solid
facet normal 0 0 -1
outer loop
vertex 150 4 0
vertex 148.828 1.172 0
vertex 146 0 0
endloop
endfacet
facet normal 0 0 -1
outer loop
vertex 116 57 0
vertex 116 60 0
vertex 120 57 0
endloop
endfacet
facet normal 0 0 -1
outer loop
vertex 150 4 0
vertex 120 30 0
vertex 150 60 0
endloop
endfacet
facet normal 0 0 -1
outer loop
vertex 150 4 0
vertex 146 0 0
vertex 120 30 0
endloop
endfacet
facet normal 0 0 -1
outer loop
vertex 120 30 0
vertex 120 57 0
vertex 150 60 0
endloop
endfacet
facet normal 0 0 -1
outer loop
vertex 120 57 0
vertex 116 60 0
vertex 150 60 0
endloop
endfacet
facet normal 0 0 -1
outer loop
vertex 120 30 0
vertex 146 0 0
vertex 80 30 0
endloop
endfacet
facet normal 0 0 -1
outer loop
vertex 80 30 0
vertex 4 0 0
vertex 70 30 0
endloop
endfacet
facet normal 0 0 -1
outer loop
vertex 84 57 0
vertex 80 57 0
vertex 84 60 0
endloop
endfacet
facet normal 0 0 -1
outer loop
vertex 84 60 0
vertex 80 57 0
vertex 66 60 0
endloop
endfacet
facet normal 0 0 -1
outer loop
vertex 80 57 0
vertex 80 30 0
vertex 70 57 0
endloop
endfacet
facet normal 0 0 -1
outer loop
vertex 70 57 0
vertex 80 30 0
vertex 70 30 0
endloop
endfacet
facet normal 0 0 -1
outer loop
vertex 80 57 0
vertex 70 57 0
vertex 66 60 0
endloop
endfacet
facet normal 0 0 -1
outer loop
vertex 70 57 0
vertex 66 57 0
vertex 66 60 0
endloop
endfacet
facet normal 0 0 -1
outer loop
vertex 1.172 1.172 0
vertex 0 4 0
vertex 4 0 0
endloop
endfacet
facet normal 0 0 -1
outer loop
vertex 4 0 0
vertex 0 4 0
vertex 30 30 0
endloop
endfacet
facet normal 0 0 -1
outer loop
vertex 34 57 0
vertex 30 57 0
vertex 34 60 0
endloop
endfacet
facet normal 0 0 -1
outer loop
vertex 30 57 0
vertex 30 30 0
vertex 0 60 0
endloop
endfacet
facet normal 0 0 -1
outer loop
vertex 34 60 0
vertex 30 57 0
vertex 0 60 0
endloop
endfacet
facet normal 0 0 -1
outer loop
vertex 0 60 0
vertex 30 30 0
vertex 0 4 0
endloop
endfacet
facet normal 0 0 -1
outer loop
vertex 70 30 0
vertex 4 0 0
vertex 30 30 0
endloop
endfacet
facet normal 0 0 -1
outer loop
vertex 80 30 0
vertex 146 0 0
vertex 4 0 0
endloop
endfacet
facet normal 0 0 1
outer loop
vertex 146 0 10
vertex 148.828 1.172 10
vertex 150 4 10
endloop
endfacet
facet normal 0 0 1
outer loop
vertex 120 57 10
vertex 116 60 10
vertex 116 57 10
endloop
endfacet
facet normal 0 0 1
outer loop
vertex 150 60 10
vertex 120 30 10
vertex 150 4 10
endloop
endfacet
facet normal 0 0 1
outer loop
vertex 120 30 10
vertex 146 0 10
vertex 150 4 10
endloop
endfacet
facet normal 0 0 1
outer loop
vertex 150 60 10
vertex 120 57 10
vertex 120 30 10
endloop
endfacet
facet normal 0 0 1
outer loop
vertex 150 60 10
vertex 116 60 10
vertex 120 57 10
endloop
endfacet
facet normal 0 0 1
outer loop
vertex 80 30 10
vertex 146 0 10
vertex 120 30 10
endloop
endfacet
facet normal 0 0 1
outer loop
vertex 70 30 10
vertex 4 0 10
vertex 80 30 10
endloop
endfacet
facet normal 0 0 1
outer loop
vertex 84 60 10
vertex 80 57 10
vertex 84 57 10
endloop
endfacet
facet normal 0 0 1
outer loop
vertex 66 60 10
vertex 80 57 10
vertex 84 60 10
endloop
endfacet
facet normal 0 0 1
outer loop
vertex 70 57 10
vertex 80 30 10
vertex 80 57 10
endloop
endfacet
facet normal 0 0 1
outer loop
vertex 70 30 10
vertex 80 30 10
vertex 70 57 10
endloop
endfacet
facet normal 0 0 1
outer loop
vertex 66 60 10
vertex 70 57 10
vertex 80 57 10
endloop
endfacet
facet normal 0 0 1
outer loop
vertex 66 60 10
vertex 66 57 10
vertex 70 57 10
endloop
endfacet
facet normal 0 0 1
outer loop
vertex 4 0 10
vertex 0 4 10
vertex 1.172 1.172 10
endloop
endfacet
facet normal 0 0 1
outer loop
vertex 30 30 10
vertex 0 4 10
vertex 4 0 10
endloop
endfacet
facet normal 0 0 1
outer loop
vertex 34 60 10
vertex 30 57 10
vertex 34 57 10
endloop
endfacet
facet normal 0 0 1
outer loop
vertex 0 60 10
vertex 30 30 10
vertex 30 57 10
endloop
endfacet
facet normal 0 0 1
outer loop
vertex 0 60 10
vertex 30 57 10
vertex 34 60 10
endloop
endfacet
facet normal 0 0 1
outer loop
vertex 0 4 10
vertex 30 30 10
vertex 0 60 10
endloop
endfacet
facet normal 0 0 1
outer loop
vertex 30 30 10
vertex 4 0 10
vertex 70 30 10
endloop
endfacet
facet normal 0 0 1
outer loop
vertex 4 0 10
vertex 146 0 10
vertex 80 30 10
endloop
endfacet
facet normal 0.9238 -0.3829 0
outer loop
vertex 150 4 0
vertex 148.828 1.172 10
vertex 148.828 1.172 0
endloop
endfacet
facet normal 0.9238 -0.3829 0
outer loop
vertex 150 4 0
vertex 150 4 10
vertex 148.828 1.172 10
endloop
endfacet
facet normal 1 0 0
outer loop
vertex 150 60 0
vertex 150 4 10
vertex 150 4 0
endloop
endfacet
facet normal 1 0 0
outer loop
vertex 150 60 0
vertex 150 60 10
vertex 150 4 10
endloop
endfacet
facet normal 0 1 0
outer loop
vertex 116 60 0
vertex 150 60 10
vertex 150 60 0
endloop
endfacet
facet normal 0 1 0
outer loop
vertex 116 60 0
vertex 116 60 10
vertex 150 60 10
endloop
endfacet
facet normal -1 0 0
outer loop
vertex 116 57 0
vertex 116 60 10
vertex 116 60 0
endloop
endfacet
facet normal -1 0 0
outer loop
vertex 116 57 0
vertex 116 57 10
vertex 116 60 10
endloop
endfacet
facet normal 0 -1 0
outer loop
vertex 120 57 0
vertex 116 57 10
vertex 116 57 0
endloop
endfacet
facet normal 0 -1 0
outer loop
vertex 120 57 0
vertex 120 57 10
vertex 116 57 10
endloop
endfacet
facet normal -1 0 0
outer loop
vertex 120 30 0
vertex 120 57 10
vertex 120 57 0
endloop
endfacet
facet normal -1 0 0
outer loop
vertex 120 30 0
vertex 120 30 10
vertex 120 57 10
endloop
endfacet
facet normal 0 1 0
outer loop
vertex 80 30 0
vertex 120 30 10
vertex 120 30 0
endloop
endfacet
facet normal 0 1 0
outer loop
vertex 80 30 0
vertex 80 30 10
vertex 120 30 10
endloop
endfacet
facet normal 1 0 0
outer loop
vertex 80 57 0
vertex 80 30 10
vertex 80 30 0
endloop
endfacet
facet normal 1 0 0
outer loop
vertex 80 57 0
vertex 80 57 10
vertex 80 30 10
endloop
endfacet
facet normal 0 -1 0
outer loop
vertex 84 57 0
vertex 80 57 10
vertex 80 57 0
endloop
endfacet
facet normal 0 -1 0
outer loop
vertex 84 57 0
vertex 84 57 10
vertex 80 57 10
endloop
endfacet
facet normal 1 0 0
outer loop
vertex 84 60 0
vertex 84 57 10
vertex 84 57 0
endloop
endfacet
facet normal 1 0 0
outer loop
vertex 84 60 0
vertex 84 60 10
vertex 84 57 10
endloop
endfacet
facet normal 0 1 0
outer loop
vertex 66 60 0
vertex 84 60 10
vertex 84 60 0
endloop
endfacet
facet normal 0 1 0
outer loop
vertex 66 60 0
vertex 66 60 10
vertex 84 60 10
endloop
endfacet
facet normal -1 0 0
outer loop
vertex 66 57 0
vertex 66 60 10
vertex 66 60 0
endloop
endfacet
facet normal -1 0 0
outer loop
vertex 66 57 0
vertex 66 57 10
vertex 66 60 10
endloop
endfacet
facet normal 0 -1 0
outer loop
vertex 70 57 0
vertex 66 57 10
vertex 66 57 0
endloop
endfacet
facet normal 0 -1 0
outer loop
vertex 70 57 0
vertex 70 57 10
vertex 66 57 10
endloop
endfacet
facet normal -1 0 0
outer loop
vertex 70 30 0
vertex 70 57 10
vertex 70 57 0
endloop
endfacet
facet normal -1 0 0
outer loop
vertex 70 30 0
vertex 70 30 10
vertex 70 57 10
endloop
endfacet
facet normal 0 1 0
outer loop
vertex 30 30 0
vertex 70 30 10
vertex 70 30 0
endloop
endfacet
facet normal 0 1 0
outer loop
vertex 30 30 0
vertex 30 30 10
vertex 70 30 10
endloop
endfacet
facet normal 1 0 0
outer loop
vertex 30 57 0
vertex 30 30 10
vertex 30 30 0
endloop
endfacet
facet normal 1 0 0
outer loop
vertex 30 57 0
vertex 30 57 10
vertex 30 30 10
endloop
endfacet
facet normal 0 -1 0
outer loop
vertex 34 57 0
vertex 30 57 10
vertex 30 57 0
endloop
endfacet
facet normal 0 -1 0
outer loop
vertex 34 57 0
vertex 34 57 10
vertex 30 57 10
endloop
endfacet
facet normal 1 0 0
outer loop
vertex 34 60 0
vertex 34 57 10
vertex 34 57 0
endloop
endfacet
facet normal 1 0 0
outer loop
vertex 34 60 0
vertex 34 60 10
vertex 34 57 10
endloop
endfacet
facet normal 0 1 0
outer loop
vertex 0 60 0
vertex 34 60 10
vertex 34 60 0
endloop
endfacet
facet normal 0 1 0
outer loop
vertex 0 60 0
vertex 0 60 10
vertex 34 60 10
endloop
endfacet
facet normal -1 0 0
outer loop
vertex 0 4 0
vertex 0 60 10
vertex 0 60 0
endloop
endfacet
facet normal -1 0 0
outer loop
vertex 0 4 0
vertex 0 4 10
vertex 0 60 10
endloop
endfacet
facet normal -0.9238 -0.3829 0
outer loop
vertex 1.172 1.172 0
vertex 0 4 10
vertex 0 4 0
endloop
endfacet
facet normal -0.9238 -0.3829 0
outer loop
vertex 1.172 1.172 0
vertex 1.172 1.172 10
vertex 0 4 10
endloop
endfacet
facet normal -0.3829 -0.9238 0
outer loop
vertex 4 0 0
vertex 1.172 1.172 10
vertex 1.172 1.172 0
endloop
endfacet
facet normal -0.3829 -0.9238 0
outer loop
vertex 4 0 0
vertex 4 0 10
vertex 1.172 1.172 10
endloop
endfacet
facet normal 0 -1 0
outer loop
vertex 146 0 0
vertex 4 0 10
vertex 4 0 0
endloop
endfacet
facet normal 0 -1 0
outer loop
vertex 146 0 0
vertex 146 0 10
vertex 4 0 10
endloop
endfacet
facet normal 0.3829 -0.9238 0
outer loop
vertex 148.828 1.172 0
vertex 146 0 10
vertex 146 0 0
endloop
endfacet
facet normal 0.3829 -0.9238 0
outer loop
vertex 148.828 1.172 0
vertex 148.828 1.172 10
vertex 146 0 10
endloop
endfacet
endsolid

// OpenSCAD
$fn = 32;

// ----------------------------------------------------------------------
// Oversize slot bar: 150 mm bar with 2 oversize windows
// ----------------------------------------------------------------------

// --- parameters (mm) ---
profile_height = 10;      // extrusion height
profile_points = 24;      // points of the closed outline

profile = [[0, 4], [1.172, 1.172], [4, 0], [146, 0], [148.828, 1.172], [150, 4], [150, 60], [116, 60], [116, 57], [120, 57], [120, 30], [80, 30], [80, 57], [84, 57], [84, 60], [66, 60], [66, 57], [70, 57], [70, 30], [30, 30], [30, 57], [34, 57], [34, 60], [0, 60]];  // single closed polygon, 24 points, counter clockwise

// --- the one profile operation ---
linear_extrude(height = profile_height) polygon(points = profile);
